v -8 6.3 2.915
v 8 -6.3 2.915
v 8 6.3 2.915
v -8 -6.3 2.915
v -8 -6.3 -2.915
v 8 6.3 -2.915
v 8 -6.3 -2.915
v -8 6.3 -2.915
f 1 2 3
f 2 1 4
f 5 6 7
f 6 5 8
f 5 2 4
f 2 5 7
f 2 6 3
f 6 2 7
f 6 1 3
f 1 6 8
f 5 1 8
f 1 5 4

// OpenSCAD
/* nokia 5110 lcd */
module nokia5110(){
    difference() {
        cube([43.87, 43.18, 1.4], center = true);
        nokia4Hole();
    }
    translate([0,0,2.4]){
        cube([40.64, 34.16, 3.5], center = true);
    }
}

module nokiaHole(){
    translate([20.3, 20, 0]){
        cylinder(h = 2, d = 2.32, center=true, $fn=120);
    }
}

module nokia2Hole(){
    nokiaHole();
    mirror(v= [180, 0, 0] ){
        nokiaHole();
    }
}

module nokia4Hole(){
    nokia2Hole();
    mirror(v= [0, 180, 0] ){
        nokia2Hole();
    }
}

/* arduino nano v3 */
module arduinoNano(){
    difference() {
        cube([17.65, 43.40, 1.58], center = true); 
        nano4Hole();
    }
    translate([0, 18.5, 2.7]){
        cube([7.6, 9.15, 3.83], center = true); 
    }
}

module nanoHole(){
    translate([8, 20.9, 0]){
            cylinder(h = 2, d = 1.42, center=true, $fn=120);
        }
}

module nano2Hole(){
    nanoHole();
    mirror(v= [180, 0, 0] ){
        nanoHole();
    }
}

module nano4Hole(){
    nano2Hole();
    mirror(v= [0, 180, 0] ){
        nano2Hole();
    }
}

/* DHT 11 */
module dht11(){
     cube([16, 12.6, 5.83], center = true); 
}
dht11();
